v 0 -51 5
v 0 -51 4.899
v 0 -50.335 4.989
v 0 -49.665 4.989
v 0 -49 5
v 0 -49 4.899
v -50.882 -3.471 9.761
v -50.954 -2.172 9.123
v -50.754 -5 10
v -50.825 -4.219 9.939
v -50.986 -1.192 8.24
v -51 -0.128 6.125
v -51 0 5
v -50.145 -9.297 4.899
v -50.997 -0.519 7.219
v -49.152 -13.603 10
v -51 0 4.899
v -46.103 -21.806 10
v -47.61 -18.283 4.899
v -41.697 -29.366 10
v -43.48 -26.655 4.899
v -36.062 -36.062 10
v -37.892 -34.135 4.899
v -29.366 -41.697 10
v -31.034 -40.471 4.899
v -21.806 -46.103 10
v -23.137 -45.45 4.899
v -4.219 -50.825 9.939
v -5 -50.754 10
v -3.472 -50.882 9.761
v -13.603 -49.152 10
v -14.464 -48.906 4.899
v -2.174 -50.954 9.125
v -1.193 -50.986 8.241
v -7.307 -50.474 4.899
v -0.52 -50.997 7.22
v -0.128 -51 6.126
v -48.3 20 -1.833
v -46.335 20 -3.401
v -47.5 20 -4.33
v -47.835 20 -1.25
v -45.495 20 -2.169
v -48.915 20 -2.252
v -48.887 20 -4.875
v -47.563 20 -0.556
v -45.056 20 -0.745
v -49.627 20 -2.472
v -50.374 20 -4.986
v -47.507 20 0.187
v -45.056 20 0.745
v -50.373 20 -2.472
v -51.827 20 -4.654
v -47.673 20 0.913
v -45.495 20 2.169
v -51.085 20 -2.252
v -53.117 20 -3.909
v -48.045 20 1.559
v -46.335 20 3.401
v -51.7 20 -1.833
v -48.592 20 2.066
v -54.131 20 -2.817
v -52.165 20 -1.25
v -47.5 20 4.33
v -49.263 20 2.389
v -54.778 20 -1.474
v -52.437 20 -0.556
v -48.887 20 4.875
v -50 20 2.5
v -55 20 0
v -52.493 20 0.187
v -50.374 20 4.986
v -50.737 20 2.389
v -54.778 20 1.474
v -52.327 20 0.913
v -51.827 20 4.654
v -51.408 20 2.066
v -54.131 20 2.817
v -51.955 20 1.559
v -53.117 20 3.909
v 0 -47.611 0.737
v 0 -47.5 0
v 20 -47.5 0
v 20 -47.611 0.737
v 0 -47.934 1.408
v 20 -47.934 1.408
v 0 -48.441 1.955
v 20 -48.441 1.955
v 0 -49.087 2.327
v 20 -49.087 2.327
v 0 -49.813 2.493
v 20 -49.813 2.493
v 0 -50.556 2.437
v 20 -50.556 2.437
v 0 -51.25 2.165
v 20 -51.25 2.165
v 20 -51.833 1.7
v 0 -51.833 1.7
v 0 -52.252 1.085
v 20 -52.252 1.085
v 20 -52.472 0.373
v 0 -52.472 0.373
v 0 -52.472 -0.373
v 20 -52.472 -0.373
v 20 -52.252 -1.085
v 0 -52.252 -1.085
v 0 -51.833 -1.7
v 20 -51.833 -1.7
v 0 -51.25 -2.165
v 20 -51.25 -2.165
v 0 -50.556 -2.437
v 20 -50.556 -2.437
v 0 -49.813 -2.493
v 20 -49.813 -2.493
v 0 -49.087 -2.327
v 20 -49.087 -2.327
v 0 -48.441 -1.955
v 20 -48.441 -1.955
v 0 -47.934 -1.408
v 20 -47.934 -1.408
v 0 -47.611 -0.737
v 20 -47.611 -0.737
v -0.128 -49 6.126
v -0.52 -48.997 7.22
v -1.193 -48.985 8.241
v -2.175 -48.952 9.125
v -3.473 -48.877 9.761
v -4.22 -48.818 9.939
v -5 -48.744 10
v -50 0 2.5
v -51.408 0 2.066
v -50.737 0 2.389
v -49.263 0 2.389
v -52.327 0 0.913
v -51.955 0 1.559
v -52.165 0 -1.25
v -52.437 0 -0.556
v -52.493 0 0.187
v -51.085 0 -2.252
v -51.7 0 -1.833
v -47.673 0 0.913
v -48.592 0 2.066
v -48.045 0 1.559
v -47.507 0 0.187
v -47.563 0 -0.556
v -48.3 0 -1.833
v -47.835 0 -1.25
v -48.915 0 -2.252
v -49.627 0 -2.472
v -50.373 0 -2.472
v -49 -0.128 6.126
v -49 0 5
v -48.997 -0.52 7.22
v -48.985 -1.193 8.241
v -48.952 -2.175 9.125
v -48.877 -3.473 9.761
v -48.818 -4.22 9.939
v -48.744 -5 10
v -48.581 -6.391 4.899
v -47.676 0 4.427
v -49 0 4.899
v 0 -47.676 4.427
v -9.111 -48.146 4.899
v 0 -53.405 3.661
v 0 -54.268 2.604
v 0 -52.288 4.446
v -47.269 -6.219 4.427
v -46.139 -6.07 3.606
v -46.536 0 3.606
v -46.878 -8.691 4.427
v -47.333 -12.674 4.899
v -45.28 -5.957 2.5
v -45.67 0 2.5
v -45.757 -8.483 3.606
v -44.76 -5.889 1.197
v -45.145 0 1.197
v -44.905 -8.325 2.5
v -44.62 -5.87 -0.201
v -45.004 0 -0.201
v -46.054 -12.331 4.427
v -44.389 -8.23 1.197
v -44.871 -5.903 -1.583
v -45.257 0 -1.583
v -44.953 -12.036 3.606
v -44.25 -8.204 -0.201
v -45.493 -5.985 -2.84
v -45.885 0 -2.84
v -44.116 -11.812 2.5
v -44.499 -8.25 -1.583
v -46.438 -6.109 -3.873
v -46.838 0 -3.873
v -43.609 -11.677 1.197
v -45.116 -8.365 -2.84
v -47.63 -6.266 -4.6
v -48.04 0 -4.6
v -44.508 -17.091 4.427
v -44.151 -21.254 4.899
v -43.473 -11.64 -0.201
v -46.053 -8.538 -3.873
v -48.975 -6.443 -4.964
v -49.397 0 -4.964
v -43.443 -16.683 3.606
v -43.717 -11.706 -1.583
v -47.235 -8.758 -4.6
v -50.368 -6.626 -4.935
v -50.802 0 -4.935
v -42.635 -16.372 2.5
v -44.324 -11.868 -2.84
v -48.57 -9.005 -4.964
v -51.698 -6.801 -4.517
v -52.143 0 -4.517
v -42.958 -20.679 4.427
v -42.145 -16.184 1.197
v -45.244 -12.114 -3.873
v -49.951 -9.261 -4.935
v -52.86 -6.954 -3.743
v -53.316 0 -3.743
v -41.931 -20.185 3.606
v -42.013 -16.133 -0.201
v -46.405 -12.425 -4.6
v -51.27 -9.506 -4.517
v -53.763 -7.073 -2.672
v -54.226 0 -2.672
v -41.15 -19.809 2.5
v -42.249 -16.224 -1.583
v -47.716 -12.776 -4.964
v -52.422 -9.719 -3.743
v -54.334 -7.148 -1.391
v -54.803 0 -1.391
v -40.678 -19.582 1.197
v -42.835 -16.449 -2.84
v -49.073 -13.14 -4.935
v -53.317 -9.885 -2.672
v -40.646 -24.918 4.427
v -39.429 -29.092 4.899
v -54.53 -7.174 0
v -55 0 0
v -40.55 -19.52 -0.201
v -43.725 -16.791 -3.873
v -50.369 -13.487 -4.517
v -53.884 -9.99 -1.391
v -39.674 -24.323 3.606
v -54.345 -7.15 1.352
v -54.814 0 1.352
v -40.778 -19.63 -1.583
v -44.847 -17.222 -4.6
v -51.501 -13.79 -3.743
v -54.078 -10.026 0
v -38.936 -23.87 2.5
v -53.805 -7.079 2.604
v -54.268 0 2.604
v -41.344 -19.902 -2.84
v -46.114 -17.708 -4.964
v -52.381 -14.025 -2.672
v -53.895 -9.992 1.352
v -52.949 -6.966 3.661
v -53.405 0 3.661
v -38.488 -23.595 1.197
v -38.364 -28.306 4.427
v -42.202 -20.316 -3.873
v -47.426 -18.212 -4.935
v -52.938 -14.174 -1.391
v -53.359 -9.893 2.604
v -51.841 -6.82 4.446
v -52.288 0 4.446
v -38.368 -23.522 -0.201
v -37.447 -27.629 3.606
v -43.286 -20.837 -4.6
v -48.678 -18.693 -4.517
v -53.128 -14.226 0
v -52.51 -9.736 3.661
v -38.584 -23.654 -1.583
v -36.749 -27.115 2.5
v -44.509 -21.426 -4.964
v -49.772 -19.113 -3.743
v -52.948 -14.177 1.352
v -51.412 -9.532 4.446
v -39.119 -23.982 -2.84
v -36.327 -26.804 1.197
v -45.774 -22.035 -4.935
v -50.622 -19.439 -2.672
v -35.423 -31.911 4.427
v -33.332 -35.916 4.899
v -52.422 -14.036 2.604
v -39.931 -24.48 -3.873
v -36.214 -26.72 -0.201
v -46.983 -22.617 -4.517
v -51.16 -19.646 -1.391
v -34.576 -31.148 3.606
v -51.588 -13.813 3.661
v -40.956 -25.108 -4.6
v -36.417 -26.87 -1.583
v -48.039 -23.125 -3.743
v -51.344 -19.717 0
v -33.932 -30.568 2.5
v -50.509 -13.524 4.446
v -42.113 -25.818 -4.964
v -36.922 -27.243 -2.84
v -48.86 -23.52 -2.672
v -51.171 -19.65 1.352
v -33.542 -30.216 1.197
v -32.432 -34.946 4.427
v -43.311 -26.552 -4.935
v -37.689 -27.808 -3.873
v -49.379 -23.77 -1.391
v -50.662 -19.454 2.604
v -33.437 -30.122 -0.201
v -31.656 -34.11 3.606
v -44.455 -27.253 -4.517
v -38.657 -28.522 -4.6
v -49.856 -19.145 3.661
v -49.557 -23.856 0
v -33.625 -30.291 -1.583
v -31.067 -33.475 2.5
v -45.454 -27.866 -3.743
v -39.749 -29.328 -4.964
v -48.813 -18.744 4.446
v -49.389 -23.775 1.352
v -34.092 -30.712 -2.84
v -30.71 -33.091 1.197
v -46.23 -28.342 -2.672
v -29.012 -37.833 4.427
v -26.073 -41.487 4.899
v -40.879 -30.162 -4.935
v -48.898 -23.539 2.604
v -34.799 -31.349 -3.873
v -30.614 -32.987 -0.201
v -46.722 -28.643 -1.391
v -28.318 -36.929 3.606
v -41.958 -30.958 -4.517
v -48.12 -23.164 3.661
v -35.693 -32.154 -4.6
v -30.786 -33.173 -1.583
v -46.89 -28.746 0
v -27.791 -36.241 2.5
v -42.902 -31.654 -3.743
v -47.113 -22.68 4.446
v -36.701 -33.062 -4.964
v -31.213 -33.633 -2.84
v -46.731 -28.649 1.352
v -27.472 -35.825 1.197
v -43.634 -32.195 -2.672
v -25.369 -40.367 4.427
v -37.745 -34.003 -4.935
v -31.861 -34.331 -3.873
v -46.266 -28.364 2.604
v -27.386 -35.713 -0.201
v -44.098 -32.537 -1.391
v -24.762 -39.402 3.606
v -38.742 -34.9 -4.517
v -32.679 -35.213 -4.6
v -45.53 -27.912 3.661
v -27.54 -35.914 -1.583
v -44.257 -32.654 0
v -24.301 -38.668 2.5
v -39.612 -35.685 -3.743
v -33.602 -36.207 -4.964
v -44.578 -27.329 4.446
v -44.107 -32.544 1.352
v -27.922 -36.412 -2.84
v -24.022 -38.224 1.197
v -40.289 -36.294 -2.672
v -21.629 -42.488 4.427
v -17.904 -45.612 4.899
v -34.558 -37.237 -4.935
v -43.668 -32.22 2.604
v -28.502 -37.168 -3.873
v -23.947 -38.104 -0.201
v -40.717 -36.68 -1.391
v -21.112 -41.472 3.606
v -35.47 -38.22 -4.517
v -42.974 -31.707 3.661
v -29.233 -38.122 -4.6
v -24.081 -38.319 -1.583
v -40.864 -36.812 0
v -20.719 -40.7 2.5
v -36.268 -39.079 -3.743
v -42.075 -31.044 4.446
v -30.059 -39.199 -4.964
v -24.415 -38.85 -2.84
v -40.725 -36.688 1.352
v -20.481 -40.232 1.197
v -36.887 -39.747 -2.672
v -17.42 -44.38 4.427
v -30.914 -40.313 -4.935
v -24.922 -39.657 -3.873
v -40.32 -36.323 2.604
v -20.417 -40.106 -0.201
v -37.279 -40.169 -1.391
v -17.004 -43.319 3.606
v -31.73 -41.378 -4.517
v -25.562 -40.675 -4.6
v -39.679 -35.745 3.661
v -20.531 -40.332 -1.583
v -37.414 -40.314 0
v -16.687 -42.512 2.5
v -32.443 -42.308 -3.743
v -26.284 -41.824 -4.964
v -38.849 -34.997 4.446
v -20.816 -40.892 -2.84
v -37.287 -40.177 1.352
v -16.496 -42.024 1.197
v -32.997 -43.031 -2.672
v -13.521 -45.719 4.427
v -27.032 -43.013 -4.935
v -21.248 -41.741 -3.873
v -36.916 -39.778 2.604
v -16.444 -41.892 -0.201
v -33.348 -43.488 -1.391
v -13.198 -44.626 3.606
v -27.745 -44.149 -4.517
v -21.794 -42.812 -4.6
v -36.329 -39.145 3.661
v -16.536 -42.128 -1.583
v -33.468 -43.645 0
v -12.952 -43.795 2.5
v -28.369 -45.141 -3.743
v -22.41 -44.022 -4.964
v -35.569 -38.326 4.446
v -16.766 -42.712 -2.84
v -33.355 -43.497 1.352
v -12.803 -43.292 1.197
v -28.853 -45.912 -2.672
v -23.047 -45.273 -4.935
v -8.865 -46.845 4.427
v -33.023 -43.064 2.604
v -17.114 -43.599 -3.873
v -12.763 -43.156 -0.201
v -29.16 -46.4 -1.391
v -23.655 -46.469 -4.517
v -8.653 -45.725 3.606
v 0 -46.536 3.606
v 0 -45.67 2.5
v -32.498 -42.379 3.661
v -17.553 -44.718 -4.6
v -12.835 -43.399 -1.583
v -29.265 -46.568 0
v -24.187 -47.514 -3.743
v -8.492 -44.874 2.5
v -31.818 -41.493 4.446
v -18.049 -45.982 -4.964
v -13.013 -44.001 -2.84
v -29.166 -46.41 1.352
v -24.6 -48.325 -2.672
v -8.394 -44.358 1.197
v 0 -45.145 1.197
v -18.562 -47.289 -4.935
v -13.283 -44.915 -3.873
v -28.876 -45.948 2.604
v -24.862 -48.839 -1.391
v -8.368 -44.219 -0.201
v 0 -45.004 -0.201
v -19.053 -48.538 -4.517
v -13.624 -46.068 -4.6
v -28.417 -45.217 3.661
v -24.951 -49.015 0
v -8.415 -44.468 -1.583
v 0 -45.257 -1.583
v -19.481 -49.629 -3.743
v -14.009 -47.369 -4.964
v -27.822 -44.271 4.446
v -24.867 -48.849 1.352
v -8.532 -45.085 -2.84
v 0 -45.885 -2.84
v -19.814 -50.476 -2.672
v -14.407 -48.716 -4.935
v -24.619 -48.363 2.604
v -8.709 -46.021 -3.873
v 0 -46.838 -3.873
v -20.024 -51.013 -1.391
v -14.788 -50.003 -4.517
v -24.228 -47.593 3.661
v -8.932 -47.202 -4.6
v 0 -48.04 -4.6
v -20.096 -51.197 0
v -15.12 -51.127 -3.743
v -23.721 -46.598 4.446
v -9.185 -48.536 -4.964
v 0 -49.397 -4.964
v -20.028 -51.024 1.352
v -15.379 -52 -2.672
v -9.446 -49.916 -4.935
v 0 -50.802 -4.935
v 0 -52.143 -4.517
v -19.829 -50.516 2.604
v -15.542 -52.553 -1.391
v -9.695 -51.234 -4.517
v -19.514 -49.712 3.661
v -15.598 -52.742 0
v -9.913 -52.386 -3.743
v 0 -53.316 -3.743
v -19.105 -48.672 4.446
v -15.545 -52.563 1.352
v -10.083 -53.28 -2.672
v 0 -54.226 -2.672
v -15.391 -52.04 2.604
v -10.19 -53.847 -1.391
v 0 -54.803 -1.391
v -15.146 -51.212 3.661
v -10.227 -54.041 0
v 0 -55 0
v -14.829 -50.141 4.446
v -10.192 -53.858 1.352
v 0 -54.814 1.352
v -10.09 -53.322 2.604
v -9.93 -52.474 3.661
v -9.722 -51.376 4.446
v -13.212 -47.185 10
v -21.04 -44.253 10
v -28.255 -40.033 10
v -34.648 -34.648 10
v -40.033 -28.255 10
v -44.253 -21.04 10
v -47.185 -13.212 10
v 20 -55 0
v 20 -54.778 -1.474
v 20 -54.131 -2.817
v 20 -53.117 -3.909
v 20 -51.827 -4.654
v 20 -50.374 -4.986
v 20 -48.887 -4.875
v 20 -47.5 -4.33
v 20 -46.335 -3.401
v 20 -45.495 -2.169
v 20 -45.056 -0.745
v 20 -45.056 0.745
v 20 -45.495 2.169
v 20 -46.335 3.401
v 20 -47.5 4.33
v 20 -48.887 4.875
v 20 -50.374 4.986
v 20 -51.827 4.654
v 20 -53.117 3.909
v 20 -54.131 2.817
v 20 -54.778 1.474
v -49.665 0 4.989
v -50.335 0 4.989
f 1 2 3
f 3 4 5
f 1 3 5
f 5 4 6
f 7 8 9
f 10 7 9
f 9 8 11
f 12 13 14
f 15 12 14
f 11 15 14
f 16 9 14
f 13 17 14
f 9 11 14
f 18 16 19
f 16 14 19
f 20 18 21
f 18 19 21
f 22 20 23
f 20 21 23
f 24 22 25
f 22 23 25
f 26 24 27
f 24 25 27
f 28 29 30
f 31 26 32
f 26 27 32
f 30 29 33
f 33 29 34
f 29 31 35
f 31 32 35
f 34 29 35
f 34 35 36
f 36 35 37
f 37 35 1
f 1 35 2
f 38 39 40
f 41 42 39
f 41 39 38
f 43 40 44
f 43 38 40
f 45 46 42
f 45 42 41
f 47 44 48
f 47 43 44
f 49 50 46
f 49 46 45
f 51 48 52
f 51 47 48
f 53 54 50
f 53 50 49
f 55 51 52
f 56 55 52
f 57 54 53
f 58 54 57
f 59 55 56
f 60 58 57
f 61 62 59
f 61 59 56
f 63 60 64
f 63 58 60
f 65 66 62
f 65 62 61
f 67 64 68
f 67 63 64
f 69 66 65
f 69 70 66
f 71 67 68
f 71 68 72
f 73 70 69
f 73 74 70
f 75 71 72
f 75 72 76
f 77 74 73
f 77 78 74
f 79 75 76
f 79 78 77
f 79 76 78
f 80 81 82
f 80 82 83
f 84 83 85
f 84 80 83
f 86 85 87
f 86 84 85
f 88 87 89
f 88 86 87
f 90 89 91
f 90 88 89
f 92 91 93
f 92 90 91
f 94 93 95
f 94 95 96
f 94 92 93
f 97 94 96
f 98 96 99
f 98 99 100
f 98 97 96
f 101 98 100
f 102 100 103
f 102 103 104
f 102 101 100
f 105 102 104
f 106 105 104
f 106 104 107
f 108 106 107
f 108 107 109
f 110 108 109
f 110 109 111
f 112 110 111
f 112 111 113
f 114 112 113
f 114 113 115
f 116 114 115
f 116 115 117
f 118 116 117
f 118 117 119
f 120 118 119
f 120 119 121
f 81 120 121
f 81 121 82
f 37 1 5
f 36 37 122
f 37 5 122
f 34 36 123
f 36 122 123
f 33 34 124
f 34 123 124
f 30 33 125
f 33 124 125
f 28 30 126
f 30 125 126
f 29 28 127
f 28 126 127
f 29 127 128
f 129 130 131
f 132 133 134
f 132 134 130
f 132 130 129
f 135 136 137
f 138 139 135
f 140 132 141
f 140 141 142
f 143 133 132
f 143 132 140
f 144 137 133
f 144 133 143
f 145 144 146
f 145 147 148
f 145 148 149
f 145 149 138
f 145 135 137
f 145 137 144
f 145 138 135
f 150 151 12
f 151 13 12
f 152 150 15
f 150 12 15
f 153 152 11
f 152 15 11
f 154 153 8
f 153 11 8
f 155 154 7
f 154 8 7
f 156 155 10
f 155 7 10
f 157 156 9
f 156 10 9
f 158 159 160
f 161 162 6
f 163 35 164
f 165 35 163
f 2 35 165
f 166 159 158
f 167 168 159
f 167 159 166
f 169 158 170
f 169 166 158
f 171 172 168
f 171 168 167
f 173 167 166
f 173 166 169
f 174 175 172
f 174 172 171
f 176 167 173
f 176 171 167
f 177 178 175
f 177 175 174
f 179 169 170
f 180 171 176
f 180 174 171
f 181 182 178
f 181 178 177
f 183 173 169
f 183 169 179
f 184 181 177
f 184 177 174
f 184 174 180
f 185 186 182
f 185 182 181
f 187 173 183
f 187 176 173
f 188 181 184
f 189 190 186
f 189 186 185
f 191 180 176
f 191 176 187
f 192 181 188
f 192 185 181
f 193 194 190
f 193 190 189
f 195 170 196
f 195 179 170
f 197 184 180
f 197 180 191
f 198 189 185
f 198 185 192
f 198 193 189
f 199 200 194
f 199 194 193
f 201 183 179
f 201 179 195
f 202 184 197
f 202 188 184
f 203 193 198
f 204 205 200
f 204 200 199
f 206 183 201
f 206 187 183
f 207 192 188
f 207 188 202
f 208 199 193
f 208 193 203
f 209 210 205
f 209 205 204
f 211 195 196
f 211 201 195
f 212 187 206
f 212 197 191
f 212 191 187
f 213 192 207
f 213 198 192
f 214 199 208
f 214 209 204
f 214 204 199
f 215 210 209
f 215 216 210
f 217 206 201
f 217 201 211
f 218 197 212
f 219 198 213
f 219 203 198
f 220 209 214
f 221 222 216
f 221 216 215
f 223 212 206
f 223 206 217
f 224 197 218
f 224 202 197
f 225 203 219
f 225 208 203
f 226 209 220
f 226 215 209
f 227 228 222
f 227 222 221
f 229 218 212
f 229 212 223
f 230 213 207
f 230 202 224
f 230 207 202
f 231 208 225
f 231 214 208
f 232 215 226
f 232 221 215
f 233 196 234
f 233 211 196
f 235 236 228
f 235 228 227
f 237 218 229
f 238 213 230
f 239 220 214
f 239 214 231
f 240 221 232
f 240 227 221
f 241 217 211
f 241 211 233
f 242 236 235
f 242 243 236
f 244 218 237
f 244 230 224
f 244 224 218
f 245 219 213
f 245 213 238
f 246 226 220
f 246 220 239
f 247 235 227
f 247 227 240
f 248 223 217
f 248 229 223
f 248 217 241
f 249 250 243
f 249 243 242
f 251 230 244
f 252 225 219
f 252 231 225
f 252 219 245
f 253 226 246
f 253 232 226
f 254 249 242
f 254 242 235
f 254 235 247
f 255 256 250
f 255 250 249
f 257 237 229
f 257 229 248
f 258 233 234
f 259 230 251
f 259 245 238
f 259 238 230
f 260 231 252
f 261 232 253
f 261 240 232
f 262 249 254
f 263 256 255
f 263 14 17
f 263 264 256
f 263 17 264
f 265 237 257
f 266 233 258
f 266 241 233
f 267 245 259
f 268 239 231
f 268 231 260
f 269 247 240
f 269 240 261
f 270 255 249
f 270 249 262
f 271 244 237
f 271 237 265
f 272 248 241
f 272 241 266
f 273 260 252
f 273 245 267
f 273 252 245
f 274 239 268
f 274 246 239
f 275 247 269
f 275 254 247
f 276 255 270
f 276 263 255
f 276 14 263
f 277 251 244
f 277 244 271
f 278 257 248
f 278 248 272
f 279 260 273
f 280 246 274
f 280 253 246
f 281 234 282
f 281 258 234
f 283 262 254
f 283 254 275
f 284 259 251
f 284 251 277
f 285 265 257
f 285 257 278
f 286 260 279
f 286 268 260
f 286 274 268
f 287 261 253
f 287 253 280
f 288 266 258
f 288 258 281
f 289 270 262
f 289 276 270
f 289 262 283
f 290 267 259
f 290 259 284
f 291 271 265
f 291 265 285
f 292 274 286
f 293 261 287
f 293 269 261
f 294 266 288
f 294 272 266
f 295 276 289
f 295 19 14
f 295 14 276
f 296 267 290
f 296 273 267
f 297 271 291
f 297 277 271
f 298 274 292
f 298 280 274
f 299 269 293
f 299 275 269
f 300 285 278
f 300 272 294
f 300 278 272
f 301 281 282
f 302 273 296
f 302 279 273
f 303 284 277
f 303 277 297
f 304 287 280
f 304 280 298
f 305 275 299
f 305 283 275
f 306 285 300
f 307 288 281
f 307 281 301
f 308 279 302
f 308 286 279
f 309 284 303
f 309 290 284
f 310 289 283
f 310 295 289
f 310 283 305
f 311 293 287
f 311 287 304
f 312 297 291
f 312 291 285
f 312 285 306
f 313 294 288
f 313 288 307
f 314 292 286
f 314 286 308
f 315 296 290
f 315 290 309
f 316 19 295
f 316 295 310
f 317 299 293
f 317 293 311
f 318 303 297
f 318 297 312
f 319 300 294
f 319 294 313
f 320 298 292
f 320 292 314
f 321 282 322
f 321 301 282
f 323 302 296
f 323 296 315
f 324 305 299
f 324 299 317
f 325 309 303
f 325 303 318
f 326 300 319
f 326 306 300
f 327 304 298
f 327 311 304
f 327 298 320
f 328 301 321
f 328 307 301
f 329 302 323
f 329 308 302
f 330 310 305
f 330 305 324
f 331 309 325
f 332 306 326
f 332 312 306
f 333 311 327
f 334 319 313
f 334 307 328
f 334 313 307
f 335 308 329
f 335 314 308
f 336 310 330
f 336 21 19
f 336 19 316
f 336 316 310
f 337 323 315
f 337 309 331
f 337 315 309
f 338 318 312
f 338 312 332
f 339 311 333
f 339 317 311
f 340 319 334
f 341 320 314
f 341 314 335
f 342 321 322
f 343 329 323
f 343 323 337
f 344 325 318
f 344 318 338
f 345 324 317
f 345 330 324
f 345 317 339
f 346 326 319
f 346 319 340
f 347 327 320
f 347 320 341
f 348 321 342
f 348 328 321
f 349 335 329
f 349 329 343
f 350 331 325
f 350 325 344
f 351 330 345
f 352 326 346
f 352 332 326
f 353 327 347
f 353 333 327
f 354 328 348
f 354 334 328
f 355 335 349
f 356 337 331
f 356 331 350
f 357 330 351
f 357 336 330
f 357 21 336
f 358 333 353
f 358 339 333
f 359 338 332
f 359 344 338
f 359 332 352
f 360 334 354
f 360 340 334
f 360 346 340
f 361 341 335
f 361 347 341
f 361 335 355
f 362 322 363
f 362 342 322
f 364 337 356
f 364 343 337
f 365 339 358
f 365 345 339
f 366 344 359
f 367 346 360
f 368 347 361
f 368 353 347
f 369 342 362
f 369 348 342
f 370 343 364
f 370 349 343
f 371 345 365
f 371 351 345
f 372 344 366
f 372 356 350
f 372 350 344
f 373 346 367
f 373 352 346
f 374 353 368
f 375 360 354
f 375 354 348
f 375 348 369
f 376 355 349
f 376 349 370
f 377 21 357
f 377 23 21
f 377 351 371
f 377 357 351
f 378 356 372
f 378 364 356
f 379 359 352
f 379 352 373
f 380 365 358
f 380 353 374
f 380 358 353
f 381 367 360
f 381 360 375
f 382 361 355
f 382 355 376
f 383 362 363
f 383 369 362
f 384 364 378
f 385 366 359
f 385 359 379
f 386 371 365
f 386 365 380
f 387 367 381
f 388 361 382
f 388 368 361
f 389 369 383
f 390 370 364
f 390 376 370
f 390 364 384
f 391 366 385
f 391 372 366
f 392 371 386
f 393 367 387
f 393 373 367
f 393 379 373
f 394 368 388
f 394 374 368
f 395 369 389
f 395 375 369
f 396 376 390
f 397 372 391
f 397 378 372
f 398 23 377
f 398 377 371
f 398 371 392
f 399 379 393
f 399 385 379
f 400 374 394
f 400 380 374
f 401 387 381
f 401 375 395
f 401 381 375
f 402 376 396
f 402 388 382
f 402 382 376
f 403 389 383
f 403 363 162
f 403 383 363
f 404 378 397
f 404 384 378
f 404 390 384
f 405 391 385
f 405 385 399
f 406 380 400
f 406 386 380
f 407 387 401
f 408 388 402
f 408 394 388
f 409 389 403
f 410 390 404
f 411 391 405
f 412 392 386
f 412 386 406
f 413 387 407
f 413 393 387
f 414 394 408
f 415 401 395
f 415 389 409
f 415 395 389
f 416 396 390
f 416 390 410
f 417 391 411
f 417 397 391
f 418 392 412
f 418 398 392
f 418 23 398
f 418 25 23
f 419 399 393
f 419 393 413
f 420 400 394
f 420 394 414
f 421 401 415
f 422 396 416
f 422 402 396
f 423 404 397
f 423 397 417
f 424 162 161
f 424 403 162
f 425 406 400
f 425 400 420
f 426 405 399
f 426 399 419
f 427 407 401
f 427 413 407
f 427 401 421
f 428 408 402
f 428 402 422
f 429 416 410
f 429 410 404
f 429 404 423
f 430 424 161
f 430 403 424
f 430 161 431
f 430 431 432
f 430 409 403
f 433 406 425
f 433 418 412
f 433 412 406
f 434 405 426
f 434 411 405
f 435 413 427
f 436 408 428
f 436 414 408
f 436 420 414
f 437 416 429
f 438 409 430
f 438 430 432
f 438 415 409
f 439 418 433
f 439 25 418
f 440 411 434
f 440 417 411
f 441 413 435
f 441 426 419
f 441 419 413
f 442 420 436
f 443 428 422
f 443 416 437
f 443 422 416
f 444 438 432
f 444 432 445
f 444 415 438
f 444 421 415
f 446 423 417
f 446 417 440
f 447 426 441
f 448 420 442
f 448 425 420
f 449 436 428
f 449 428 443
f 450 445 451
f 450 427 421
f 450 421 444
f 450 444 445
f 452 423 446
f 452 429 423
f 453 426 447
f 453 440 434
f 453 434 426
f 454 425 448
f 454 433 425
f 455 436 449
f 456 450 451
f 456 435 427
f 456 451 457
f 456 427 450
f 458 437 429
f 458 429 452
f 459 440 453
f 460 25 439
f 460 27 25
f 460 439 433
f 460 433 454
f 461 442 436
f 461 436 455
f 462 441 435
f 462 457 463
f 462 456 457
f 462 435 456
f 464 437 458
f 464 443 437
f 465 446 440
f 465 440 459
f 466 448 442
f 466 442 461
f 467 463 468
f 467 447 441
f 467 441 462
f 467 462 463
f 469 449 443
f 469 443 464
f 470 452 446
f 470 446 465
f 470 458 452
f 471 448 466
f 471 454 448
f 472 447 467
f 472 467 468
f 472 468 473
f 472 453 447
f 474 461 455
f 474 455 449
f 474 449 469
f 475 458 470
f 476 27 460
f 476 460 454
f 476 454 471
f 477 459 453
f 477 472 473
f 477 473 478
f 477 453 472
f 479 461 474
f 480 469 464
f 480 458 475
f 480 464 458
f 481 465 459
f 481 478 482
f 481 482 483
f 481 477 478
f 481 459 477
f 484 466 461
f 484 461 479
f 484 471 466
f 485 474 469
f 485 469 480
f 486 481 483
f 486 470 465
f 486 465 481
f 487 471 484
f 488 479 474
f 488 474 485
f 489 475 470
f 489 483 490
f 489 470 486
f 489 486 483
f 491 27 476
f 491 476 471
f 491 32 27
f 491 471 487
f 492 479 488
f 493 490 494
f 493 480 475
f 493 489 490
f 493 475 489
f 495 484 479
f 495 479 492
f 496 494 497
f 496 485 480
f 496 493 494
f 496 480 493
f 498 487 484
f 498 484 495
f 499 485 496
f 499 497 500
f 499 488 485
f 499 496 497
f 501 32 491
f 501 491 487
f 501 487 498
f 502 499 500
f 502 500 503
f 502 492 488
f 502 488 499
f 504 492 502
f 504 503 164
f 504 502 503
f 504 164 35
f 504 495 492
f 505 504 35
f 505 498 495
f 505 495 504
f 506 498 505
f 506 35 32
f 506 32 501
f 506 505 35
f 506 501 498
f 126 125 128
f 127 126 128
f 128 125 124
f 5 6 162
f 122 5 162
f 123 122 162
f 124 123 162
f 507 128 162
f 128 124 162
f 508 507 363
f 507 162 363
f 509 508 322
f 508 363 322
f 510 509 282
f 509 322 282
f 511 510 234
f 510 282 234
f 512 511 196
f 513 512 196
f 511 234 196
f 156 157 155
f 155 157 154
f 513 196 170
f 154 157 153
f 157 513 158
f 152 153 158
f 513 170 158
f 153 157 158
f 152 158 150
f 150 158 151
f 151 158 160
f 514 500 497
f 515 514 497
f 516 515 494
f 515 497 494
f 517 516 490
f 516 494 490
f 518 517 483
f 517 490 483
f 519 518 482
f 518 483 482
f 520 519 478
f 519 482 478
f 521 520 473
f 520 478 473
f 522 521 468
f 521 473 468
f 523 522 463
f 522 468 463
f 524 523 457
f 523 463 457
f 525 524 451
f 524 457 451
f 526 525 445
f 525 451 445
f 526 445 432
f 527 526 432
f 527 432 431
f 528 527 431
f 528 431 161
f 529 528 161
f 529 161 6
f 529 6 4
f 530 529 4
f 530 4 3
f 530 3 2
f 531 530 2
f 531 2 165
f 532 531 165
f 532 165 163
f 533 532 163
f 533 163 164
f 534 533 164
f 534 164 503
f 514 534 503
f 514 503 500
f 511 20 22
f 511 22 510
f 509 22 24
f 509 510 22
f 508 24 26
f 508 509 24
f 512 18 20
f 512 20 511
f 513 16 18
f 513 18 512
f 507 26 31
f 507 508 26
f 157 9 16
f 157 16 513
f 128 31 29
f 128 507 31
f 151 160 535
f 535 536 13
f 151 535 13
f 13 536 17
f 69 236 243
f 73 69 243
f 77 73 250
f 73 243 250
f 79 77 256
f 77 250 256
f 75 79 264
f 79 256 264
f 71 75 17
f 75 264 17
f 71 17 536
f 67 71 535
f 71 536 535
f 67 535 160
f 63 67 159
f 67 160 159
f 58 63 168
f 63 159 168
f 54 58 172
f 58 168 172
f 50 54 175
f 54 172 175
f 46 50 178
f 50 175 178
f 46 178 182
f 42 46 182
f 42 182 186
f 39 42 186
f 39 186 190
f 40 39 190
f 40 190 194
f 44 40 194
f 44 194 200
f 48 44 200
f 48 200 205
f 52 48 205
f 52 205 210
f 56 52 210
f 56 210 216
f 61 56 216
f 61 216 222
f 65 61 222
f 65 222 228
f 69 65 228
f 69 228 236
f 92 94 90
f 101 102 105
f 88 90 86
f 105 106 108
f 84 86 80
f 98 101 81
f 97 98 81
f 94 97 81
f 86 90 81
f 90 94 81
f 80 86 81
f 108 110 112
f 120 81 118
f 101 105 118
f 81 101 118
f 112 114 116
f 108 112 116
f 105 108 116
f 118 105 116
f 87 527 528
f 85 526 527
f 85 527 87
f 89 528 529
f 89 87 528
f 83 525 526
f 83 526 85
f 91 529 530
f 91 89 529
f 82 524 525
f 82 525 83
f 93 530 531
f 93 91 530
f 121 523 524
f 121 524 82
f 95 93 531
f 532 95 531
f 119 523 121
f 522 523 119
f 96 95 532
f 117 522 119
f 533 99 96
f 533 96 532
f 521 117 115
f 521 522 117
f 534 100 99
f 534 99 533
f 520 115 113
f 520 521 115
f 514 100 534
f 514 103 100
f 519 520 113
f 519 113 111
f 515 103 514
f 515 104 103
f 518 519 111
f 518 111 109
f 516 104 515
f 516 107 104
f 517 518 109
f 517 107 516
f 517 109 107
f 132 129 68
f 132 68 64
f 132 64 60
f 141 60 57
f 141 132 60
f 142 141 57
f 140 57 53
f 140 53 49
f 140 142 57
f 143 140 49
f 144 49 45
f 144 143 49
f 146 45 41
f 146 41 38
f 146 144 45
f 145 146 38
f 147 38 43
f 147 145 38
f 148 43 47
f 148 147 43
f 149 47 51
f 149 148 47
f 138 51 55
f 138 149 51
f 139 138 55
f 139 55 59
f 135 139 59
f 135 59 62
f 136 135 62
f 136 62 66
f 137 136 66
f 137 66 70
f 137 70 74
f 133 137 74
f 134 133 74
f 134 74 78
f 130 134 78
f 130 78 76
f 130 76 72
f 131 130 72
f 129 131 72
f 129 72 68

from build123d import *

# Parameters (mm, degrees)
SKETCH_4_R      = 5
REVOLVE_1_ANGLE = 90
SKETCH_5_R      = 5
SKETCH_5_R_2    = 2.5
EXTRUDE_4_DEPTH = 20
SKETCH_6_R      = 5
SKETCH_6_R_2    = 2.5
EXTRUDE_5_DEPTH = 20
EXTRUDE_6_DEPTH = 10
FILLET_1_R      = 5


with BuildPart() as part:
    # 草圖4 → 旋轉1 (revolve)
    with BuildSketch(Plane(origin=(0, 0, 0), x_dir=(1, 0, 0), z_dir=(0, 1, 0))):
        with Locations((-50, 0)):
            Circle(SKETCH_4_R)
    revolve(axis=Axis((0, 0, -3.474942085), (0, 0, 1)), revolution_arc=REVOLVE_1_ANGLE)

    # 草圖5 → 填料-伸長4 (add)
    with BuildSketch(Plane(origin=(0, 0, 0), x_dir=(0, 0, -1), z_dir=(1, 0, 0))):
        with Locations(Location((0, -50, 0), (0, 0, 270))):
            Circle(SKETCH_5_R)
        with Locations(Location((0, -50, 0), (0, 0, 90))):
            Circle(SKETCH_5_R_2, mode=Mode.SUBTRACT)
    extrude(amount=EXTRUDE_4_DEPTH)

    # 草圖6 → 填料-伸長5 (add)
    with BuildSketch(Plane(origin=(0, 0, 0), x_dir=(1, 0, 0), z_dir=(0, 1, 0))):
        with Locations(Location((-50, 0, 0), (0, 0, 180))):
            Circle(SKETCH_6_R)
        with Locations(Location((-50, 0, 0), (0, 0, 270))):
            Circle(SKETCH_6_R_2, mode=Mode.SUBTRACT)
    extrude(amount=EXTRUDE_5_DEPTH)

    # 草圖7 → 填料-伸長6 (add)
    with BuildSketch(Plane.XY):
        with BuildLine():
            Line((-49, 0), (-51, 0))
            ThreePointArc((-51, 0), (-36.062445841, -36.062445841), (0, -51))
            Line((0, -51), (0, -49))
            ThreePointArc((0, -49), (-34.648232278, -34.648232278), (-49, 0))
        make_face()
    extrude(amount=EXTRUDE_6_DEPTH)

    # 圓角1
    fillet_1_edges = [part.edges().sort_by_distance(p)[0] for p in [
        (-50, 0, 10),
        (0, -50, 10),
    ]]
    fillet(fillet_1_edges, radius=FILLET_1_R - 0.0001)  # a hair under: the kernel refuses the full size


solid = part.part
